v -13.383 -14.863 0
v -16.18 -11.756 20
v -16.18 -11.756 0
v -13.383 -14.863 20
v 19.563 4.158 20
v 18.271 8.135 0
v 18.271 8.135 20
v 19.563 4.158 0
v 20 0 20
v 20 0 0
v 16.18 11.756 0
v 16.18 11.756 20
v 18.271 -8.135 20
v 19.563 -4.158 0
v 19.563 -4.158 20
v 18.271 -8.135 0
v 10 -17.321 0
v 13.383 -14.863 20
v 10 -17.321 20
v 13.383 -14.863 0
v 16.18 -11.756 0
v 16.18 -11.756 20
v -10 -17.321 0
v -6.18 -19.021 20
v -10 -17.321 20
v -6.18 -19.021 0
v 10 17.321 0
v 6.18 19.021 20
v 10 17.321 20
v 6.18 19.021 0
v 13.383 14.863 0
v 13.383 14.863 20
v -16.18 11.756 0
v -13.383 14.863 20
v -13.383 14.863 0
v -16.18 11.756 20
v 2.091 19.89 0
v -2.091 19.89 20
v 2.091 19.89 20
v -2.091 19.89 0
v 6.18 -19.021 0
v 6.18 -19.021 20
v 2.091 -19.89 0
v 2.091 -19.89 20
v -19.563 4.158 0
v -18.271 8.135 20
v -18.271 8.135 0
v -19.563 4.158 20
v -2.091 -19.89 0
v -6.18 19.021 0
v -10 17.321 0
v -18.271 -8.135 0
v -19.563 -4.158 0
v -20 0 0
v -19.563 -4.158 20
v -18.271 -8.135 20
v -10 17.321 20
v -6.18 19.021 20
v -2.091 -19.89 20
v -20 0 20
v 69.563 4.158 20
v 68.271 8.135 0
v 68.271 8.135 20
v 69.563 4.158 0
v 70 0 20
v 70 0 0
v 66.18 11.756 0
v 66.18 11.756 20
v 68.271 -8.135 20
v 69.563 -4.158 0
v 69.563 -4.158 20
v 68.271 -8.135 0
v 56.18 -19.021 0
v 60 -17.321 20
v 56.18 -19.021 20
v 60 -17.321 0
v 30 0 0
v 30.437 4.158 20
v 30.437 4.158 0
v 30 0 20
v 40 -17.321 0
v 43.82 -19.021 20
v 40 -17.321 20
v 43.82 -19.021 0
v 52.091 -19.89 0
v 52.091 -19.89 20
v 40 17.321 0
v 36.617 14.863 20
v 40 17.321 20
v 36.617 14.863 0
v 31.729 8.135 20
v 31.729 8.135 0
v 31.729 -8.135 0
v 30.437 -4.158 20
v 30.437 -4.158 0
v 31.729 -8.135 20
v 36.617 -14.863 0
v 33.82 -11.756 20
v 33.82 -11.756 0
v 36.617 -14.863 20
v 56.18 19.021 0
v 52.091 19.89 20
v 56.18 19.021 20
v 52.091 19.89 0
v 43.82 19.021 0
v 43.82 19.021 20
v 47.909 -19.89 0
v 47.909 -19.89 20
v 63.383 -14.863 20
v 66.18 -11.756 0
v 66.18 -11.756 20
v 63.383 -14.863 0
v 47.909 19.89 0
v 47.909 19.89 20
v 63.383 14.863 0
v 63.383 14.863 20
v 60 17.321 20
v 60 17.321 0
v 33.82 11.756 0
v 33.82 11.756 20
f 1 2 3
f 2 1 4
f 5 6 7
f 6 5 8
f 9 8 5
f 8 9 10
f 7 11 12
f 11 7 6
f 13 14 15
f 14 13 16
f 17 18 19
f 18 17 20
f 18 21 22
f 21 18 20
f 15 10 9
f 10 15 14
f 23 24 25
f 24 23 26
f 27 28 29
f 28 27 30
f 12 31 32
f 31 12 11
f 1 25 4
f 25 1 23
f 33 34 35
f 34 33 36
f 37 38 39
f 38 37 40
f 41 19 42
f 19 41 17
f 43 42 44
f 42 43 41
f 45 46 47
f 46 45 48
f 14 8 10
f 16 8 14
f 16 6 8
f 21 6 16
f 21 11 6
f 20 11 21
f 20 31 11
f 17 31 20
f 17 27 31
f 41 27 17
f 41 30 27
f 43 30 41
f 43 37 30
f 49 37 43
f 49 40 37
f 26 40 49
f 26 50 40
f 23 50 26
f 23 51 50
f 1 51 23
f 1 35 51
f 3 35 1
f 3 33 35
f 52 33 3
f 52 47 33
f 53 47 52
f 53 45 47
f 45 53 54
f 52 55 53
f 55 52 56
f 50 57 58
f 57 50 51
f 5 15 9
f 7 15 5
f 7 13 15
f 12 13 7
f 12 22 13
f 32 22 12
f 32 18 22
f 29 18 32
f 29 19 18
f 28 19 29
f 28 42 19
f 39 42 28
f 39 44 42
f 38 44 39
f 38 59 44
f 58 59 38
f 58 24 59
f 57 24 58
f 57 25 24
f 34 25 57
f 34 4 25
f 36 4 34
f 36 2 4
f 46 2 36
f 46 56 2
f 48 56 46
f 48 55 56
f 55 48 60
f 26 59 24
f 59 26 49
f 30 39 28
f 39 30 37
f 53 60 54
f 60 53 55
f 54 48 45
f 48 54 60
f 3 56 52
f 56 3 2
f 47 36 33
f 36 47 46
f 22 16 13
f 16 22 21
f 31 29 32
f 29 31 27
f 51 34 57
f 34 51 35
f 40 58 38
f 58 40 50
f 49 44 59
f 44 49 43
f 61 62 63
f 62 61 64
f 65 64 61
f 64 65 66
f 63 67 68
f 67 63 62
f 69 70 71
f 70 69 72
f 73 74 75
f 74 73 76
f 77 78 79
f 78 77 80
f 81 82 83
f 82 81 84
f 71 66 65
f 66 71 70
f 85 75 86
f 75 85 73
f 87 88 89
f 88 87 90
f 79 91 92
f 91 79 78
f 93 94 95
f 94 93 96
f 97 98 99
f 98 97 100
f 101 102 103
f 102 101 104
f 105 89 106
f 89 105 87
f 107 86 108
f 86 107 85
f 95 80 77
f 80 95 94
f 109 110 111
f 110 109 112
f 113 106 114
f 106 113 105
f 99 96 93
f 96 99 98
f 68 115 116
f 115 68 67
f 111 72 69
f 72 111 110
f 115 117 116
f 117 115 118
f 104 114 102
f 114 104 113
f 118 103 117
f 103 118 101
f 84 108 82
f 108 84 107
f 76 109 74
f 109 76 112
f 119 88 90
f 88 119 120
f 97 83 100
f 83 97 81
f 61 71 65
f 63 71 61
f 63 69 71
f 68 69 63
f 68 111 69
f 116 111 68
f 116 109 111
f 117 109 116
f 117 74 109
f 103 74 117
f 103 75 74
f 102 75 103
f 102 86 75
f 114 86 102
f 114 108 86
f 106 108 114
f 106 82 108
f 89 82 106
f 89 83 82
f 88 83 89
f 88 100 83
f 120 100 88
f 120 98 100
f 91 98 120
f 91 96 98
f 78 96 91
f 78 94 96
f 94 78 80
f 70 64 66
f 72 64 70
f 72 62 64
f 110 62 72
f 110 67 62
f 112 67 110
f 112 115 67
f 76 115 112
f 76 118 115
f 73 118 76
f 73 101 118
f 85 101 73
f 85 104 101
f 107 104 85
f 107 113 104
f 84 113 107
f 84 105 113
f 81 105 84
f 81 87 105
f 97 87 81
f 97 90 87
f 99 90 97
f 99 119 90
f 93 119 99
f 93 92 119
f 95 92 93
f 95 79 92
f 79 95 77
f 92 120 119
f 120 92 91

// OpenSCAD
x=10;

cylinder(h=20, r=x);

x=20;

translate([50,0,0]) cylinder(h=20, r=x);
